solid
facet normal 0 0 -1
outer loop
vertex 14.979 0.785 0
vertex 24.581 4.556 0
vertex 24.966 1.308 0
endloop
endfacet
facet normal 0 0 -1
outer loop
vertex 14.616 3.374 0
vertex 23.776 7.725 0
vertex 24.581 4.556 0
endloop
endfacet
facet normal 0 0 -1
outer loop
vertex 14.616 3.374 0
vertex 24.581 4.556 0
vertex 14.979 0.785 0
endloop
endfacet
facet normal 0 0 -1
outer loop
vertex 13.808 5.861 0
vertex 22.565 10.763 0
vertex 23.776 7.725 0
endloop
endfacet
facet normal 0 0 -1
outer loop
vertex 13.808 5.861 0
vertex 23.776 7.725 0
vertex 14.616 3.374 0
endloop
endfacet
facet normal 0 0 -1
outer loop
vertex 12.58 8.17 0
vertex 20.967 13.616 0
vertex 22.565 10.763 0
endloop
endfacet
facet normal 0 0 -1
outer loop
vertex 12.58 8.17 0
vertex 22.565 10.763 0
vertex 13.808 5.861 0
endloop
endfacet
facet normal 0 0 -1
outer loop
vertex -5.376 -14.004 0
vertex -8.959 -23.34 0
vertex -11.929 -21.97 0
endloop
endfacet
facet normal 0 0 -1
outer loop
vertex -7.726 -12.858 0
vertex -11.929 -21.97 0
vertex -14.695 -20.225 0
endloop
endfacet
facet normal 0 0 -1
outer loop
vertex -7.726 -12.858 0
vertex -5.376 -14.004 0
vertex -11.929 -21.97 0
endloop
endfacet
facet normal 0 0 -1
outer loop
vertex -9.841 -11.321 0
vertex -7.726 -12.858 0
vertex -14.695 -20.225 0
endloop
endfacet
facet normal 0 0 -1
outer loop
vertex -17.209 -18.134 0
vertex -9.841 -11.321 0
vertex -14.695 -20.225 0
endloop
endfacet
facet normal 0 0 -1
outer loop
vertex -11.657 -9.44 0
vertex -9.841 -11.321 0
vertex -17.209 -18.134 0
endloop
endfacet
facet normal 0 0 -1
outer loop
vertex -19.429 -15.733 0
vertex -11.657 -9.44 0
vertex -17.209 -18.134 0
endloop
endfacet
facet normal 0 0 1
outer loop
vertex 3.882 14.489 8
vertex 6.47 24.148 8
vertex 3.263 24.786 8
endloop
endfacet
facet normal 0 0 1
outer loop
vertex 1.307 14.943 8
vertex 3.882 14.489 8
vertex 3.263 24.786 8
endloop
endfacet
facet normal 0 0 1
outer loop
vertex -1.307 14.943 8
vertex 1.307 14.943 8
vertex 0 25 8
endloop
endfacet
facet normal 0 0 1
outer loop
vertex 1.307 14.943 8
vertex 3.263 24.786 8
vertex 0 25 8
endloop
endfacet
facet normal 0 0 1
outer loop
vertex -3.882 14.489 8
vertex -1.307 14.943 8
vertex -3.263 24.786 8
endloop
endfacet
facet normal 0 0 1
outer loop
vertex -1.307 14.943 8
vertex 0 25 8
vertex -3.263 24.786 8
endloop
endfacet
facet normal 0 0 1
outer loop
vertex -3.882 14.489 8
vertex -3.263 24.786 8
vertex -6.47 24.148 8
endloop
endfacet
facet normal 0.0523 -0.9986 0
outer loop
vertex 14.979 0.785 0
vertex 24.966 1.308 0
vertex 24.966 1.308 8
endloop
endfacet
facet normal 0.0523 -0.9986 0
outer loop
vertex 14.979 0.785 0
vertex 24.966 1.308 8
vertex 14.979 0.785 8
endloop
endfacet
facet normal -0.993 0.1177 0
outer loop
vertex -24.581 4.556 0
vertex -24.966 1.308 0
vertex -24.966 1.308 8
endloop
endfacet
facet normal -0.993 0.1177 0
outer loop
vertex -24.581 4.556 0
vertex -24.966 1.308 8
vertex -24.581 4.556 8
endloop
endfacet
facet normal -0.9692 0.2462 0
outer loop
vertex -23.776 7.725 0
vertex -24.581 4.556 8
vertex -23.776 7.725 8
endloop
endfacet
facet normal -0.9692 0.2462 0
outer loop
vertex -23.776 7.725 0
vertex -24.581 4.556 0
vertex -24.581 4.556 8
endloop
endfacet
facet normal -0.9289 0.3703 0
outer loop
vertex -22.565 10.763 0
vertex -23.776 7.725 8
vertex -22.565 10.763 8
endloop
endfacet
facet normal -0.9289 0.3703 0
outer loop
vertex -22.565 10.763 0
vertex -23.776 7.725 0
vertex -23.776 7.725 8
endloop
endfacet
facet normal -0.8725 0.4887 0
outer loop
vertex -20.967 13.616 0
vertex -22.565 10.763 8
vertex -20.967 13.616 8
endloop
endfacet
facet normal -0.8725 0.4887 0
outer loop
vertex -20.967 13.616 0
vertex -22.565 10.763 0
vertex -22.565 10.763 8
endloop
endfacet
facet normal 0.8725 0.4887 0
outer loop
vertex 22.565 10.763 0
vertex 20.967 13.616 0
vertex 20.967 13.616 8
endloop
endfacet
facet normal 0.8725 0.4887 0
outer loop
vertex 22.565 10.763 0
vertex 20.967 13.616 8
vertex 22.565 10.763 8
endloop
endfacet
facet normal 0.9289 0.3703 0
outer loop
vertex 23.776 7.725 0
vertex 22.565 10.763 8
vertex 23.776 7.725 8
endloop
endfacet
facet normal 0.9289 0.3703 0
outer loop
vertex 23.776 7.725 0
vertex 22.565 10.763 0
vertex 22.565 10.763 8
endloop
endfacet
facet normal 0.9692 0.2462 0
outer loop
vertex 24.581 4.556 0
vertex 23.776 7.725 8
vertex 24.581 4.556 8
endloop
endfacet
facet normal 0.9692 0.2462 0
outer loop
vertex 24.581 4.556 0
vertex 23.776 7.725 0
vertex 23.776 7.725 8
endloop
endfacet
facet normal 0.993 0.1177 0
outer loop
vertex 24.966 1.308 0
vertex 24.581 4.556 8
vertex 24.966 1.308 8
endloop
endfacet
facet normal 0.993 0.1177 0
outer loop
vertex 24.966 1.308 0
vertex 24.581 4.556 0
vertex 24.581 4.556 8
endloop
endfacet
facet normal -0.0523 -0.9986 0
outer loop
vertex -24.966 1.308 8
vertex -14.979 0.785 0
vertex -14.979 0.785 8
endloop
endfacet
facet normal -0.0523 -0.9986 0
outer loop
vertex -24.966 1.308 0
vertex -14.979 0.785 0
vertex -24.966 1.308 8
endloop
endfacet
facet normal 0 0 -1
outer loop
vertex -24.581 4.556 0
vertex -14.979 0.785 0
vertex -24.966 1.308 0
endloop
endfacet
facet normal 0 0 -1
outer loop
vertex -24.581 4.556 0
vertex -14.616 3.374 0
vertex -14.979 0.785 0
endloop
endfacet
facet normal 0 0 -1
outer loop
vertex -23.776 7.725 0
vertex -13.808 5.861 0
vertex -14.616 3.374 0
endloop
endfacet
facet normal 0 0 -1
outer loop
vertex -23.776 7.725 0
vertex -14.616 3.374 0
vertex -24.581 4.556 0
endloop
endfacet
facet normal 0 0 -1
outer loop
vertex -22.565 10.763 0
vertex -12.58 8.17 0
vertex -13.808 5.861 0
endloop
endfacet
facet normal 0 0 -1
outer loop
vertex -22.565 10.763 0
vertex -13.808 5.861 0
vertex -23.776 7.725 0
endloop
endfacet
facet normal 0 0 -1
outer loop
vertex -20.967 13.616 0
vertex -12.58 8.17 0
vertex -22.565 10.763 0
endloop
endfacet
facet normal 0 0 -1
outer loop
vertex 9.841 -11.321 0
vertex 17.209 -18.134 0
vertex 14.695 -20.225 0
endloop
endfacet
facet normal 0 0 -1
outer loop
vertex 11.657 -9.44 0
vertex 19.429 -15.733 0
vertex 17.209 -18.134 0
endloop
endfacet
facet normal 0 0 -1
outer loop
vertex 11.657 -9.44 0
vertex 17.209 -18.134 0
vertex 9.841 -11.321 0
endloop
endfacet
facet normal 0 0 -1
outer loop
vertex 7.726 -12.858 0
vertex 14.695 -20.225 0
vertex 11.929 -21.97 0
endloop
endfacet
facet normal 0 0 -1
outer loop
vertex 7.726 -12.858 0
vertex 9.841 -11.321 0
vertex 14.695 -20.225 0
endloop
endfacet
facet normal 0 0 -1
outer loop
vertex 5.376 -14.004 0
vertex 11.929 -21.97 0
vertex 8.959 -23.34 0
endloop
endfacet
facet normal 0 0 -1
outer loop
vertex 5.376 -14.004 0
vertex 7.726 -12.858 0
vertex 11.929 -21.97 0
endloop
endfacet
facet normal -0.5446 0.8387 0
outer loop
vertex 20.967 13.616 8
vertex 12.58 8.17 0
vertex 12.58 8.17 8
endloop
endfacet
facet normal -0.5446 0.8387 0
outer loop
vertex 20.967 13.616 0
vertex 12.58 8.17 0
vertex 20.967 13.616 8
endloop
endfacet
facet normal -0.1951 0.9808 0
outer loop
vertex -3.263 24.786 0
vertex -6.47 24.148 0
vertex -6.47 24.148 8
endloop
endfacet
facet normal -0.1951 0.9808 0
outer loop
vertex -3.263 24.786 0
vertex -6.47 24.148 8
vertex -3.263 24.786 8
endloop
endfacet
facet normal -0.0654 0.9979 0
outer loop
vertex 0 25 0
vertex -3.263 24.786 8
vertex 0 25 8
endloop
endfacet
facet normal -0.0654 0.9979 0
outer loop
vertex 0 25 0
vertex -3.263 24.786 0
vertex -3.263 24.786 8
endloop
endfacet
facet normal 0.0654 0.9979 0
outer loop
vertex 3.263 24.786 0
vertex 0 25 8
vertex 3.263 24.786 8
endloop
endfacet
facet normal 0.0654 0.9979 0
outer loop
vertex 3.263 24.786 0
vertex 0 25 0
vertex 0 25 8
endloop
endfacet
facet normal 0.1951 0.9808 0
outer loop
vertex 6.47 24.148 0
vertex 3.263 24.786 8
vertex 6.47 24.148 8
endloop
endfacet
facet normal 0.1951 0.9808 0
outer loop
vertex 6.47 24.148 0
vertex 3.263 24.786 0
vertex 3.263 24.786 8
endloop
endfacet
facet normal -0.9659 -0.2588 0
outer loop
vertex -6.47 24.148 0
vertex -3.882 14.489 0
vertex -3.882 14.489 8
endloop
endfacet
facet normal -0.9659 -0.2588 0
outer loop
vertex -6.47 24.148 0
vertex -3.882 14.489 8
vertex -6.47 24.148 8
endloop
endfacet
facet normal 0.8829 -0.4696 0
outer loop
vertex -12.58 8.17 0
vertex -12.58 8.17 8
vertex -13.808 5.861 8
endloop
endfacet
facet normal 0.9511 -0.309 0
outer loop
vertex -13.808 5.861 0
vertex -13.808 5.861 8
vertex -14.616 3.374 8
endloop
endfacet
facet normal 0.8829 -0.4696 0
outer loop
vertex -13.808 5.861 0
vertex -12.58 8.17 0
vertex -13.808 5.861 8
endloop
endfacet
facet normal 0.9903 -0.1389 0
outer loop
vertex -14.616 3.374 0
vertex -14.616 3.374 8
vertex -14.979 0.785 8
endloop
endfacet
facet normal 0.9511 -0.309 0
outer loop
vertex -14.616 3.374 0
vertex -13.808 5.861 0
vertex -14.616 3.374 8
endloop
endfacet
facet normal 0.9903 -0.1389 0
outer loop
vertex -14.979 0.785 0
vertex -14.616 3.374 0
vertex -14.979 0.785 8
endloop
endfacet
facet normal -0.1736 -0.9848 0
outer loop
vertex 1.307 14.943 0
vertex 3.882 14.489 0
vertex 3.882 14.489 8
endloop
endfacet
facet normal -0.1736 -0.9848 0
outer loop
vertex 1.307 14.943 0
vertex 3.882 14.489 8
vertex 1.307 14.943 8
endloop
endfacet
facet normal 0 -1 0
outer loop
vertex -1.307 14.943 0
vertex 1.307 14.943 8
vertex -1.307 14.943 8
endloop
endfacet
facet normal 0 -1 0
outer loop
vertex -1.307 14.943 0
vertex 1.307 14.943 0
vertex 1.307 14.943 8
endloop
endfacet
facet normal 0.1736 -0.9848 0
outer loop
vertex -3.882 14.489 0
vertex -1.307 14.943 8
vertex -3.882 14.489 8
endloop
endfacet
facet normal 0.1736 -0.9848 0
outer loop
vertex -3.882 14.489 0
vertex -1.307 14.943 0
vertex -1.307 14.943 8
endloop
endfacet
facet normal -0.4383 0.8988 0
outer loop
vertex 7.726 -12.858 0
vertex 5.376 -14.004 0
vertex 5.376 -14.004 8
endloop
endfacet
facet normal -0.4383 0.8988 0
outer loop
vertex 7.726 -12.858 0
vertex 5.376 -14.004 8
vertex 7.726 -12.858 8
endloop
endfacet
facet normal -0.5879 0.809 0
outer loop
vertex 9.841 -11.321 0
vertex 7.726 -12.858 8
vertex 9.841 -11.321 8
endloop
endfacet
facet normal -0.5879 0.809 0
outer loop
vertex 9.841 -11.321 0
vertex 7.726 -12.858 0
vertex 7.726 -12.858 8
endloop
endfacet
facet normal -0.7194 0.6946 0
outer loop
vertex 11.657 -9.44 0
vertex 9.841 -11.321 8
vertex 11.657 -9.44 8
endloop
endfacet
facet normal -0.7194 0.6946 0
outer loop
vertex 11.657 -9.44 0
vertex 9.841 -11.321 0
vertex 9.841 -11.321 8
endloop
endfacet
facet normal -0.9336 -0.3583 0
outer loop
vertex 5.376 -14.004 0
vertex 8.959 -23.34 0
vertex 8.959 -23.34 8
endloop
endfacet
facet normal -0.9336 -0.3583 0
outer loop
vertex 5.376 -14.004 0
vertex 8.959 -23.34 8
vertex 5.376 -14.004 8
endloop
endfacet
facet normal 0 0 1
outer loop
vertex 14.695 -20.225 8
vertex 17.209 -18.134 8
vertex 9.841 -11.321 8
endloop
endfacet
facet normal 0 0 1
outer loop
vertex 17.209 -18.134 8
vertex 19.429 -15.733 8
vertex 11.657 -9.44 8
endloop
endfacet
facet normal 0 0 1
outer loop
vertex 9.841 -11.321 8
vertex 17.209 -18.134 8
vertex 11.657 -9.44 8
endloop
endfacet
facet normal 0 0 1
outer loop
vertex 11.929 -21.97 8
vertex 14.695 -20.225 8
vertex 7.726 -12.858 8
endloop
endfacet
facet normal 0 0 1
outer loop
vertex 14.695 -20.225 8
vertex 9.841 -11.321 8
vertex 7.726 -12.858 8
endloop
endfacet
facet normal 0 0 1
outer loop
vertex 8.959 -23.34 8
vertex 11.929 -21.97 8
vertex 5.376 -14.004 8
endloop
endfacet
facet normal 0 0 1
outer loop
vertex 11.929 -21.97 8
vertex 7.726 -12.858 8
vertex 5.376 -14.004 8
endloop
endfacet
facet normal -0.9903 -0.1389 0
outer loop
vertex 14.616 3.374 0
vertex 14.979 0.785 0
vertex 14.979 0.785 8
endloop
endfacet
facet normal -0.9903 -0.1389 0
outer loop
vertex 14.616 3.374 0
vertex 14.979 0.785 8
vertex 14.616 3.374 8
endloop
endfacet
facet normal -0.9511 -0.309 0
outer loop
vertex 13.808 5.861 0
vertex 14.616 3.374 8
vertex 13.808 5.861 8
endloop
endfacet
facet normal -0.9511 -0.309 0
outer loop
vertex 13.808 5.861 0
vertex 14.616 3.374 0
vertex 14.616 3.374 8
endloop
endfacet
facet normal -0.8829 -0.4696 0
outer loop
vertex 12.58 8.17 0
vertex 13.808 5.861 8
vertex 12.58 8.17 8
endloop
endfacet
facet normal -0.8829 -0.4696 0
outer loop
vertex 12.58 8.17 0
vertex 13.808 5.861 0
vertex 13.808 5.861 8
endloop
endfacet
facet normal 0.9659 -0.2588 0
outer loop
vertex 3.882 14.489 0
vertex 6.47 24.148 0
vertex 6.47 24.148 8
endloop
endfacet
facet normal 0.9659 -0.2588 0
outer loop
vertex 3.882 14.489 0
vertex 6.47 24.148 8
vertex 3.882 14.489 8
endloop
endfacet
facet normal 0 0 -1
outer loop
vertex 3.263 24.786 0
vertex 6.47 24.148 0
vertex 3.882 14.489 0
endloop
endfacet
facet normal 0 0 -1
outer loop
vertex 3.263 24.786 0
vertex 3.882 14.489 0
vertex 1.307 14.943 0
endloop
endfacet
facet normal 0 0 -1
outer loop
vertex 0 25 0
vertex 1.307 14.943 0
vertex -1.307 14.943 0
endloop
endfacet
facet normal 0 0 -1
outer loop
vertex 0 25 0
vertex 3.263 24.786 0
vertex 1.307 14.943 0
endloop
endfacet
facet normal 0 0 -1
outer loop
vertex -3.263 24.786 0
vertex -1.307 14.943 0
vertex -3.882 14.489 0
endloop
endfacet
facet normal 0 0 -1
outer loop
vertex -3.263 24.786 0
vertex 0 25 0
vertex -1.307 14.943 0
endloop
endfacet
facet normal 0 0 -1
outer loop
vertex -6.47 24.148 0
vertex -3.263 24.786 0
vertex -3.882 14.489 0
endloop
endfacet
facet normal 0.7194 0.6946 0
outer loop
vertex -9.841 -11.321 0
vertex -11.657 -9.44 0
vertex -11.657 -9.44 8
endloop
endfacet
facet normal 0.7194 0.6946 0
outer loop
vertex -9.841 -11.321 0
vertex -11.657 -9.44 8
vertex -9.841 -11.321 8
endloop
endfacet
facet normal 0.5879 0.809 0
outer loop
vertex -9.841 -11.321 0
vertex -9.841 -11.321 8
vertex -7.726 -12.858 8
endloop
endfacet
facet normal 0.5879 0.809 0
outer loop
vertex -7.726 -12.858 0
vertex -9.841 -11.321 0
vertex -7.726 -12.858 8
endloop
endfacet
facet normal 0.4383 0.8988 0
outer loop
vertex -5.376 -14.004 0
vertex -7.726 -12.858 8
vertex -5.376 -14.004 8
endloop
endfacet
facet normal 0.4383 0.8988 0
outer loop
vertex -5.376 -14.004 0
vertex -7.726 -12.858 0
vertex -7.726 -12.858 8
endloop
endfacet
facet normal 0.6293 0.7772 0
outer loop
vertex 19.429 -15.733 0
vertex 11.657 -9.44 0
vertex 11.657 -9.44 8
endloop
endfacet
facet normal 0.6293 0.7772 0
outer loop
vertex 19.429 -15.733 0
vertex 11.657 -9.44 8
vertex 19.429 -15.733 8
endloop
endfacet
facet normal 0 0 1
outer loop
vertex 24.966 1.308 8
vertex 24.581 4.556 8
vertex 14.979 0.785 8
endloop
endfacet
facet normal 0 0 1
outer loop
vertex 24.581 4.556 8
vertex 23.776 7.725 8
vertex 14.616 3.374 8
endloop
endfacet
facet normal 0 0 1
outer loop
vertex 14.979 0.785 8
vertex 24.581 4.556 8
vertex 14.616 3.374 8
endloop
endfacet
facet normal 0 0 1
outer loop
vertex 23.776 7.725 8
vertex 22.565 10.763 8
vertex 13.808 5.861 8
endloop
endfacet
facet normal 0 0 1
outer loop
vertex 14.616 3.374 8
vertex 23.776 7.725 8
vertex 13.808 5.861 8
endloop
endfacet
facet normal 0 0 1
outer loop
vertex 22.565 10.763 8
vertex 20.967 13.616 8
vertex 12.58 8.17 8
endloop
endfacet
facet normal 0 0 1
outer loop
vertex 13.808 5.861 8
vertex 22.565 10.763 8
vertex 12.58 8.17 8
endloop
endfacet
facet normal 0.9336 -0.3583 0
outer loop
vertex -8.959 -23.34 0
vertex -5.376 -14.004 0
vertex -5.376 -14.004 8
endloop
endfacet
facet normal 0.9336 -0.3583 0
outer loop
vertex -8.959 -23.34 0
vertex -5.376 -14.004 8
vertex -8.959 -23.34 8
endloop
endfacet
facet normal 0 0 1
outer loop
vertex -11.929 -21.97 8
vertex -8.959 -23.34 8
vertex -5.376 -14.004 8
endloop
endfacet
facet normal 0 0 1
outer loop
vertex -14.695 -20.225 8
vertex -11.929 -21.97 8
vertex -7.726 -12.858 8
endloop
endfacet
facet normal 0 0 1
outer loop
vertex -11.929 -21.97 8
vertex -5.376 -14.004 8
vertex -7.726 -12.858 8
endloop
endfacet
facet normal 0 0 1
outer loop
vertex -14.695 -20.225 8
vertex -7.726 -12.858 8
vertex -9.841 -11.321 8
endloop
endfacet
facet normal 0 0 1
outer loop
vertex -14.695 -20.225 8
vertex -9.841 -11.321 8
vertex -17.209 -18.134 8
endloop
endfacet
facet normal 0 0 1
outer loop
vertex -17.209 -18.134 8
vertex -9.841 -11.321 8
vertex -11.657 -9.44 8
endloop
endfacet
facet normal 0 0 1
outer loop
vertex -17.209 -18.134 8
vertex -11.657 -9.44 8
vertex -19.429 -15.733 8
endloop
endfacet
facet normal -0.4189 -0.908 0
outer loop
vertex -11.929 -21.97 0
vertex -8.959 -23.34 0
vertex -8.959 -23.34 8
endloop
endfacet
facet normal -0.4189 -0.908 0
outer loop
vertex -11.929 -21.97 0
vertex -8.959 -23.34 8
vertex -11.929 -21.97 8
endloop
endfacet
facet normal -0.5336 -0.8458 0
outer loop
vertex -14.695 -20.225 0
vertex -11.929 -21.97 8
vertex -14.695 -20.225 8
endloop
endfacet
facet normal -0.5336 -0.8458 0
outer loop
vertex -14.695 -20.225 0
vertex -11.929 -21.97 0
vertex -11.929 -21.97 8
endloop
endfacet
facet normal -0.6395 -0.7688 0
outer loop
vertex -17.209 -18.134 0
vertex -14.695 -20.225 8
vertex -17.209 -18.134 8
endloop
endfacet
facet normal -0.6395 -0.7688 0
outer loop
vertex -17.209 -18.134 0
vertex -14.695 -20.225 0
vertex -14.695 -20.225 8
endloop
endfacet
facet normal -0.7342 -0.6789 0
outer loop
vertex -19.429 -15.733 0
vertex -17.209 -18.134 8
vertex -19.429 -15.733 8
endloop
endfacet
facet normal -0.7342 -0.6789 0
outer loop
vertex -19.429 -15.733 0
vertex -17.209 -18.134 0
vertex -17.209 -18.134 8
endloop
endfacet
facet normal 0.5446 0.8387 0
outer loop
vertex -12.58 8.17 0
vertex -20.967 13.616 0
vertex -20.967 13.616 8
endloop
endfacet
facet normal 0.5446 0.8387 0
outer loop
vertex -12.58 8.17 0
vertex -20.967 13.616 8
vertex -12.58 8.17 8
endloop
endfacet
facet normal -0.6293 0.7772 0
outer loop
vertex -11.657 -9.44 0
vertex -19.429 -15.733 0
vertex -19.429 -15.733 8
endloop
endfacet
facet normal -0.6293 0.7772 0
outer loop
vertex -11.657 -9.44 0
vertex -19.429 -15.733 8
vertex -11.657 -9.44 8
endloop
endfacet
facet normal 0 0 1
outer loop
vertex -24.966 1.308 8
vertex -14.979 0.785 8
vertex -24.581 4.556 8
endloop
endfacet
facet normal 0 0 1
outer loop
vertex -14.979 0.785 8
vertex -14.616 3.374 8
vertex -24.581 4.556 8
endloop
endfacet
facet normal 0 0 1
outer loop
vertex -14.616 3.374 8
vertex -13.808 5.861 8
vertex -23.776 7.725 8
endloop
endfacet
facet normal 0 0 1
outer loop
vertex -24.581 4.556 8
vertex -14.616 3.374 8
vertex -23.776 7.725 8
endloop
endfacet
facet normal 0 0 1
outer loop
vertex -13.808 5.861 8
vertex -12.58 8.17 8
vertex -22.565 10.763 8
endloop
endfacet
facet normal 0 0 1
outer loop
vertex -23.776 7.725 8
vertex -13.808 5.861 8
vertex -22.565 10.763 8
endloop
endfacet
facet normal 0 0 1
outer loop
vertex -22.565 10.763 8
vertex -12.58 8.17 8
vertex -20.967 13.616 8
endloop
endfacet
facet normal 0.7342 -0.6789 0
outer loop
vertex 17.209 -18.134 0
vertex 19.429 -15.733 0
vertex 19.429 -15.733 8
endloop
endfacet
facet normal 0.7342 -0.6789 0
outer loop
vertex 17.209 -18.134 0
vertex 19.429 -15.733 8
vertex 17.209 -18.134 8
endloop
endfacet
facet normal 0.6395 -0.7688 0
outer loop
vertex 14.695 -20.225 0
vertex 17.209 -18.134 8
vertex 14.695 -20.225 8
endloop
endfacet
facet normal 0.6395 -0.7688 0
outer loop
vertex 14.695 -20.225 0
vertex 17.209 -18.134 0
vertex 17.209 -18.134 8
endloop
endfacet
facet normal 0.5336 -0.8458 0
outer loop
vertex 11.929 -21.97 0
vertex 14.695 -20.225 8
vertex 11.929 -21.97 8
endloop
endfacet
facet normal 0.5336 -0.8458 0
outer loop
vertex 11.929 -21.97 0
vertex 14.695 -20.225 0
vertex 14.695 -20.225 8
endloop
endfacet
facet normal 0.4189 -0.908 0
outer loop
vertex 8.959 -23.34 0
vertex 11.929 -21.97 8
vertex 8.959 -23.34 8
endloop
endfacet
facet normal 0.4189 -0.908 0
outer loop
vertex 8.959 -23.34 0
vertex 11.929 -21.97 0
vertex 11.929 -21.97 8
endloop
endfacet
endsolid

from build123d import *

# Parameters (mm, degrees)
BOSS_EXTRUDE1_DEPTH   = 8
BOSS_EXTRUDE1_2_DEPTH = 8
BOSS_EXTRUDE1_3_DEPTH = 8
BOSS_EXTRUDE1_4_DEPTH = 8
BOSS_EXTRUDE1_5_DEPTH = 8


with BuildPart() as part:
    # Sketch1 → Boss-Extrude1 (new body)
    with BuildSketch(Plane.XY):
        with BuildLine():
            Line((-3.882285677, 14.488887394), (-6.470476128, 24.148145657))
            ThreePointArc((-6.470476128, 24.148145657), (0, 25), (6.470476128, 24.148145657))
            Line((6.470476128, 24.148145657), (3.882285677, 14.488887394))
            ThreePointArc((3.882285677, 14.488887394), (0, 15), (-3.882285677, 14.488887394))
        make_face()
    extrude(amount=BOSS_EXTRUDE1_DEPTH)


with BuildPart() as body_2:
    # Sketch1 → Boss-Extrude1 2 (new body)
    with BuildSketch(Plane.XY):
        with BuildLine():
            Line((12.580058519, 8.169585525), (20.966764199, 13.615975875))
            ThreePointArc((20.966764199, 13.615975875), (23.776412907, 7.725424859), (24.965738369, 1.308398906))
            Line((24.965738369, 1.308398906), (14.979443021, 0.785039344))
            ThreePointArc((14.979443021, 0.785039344), (14.265847744, 4.635254916), (12.580058519, 8.169585525))
        make_face()
    extrude(amount=BOSS_EXTRUDE1_2_DEPTH)


with BuildPart() as body_3:
    # Sketch1 → Boss-Extrude1 3 (new body)
    with BuildSketch(Plane.XY):
        with BuildLine():
            Line((11.657189422, -9.439805866), (19.428649036, -15.733009776))
            ThreePointArc((19.428649036, -15.733009776), (14.694631307, -20.225424859), (8.959198739, -23.339510662))
            Line((8.959198739, -23.339510662), (5.375519243, -14.003706397))
            ThreePointArc((5.375519243, -14.003706397), (8.816778784, -12.135254916), (11.657189422, -9.439805866))
        make_face()
    extrude(amount=BOSS_EXTRUDE1_3_DEPTH)


with BuildPart() as body_4:
    # Sketch1 → Boss-Extrude1 4 (new body)
    with BuildSketch(Plane.XY):
        with BuildLine():
            Line((-5.375519243, -14.003706397), (-8.959198739, -23.339510662))
            ThreePointArc((-8.959198739, -23.339510662), (-14.694631307, -20.225424859), (-19.428649036, -15.733009776))
            Line((-19.428649036, -15.733009776), (-11.657189422, -9.439805866))
            ThreePointArc((-11.657189422, -9.439805866), (-8.816778784, -12.135254916), (-5.375519243, -14.003706397))
        make_face()
    extrude(amount=BOSS_EXTRUDE1_4_DEPTH)


with BuildPart() as body_5:
    # Sketch1 → Boss-Extrude1 5 (new body)
    with BuildSketch(Plane.XY):
        with BuildLine():
            Line((-14.979443021, 0.785039344), (-24.965738369, 1.308398906))
            ThreePointArc((-24.965738369, 1.308398906), (-23.776412907, 7.725424859), (-20.966764199, 13.615975875))
            Line((-20.966764199, 13.615975875), (-12.580058519, 8.169585525))
            ThreePointArc((-12.580058519, 8.169585525), (-14.265847744, 4.635254916), (-14.979443021, 0.785039344))
        make_face()
    extrude(amount=BOSS_EXTRUDE1_5_DEPTH)


solid = Compound([part.part, body_2.part, body_3.part, body_4.part, body_5.part])
